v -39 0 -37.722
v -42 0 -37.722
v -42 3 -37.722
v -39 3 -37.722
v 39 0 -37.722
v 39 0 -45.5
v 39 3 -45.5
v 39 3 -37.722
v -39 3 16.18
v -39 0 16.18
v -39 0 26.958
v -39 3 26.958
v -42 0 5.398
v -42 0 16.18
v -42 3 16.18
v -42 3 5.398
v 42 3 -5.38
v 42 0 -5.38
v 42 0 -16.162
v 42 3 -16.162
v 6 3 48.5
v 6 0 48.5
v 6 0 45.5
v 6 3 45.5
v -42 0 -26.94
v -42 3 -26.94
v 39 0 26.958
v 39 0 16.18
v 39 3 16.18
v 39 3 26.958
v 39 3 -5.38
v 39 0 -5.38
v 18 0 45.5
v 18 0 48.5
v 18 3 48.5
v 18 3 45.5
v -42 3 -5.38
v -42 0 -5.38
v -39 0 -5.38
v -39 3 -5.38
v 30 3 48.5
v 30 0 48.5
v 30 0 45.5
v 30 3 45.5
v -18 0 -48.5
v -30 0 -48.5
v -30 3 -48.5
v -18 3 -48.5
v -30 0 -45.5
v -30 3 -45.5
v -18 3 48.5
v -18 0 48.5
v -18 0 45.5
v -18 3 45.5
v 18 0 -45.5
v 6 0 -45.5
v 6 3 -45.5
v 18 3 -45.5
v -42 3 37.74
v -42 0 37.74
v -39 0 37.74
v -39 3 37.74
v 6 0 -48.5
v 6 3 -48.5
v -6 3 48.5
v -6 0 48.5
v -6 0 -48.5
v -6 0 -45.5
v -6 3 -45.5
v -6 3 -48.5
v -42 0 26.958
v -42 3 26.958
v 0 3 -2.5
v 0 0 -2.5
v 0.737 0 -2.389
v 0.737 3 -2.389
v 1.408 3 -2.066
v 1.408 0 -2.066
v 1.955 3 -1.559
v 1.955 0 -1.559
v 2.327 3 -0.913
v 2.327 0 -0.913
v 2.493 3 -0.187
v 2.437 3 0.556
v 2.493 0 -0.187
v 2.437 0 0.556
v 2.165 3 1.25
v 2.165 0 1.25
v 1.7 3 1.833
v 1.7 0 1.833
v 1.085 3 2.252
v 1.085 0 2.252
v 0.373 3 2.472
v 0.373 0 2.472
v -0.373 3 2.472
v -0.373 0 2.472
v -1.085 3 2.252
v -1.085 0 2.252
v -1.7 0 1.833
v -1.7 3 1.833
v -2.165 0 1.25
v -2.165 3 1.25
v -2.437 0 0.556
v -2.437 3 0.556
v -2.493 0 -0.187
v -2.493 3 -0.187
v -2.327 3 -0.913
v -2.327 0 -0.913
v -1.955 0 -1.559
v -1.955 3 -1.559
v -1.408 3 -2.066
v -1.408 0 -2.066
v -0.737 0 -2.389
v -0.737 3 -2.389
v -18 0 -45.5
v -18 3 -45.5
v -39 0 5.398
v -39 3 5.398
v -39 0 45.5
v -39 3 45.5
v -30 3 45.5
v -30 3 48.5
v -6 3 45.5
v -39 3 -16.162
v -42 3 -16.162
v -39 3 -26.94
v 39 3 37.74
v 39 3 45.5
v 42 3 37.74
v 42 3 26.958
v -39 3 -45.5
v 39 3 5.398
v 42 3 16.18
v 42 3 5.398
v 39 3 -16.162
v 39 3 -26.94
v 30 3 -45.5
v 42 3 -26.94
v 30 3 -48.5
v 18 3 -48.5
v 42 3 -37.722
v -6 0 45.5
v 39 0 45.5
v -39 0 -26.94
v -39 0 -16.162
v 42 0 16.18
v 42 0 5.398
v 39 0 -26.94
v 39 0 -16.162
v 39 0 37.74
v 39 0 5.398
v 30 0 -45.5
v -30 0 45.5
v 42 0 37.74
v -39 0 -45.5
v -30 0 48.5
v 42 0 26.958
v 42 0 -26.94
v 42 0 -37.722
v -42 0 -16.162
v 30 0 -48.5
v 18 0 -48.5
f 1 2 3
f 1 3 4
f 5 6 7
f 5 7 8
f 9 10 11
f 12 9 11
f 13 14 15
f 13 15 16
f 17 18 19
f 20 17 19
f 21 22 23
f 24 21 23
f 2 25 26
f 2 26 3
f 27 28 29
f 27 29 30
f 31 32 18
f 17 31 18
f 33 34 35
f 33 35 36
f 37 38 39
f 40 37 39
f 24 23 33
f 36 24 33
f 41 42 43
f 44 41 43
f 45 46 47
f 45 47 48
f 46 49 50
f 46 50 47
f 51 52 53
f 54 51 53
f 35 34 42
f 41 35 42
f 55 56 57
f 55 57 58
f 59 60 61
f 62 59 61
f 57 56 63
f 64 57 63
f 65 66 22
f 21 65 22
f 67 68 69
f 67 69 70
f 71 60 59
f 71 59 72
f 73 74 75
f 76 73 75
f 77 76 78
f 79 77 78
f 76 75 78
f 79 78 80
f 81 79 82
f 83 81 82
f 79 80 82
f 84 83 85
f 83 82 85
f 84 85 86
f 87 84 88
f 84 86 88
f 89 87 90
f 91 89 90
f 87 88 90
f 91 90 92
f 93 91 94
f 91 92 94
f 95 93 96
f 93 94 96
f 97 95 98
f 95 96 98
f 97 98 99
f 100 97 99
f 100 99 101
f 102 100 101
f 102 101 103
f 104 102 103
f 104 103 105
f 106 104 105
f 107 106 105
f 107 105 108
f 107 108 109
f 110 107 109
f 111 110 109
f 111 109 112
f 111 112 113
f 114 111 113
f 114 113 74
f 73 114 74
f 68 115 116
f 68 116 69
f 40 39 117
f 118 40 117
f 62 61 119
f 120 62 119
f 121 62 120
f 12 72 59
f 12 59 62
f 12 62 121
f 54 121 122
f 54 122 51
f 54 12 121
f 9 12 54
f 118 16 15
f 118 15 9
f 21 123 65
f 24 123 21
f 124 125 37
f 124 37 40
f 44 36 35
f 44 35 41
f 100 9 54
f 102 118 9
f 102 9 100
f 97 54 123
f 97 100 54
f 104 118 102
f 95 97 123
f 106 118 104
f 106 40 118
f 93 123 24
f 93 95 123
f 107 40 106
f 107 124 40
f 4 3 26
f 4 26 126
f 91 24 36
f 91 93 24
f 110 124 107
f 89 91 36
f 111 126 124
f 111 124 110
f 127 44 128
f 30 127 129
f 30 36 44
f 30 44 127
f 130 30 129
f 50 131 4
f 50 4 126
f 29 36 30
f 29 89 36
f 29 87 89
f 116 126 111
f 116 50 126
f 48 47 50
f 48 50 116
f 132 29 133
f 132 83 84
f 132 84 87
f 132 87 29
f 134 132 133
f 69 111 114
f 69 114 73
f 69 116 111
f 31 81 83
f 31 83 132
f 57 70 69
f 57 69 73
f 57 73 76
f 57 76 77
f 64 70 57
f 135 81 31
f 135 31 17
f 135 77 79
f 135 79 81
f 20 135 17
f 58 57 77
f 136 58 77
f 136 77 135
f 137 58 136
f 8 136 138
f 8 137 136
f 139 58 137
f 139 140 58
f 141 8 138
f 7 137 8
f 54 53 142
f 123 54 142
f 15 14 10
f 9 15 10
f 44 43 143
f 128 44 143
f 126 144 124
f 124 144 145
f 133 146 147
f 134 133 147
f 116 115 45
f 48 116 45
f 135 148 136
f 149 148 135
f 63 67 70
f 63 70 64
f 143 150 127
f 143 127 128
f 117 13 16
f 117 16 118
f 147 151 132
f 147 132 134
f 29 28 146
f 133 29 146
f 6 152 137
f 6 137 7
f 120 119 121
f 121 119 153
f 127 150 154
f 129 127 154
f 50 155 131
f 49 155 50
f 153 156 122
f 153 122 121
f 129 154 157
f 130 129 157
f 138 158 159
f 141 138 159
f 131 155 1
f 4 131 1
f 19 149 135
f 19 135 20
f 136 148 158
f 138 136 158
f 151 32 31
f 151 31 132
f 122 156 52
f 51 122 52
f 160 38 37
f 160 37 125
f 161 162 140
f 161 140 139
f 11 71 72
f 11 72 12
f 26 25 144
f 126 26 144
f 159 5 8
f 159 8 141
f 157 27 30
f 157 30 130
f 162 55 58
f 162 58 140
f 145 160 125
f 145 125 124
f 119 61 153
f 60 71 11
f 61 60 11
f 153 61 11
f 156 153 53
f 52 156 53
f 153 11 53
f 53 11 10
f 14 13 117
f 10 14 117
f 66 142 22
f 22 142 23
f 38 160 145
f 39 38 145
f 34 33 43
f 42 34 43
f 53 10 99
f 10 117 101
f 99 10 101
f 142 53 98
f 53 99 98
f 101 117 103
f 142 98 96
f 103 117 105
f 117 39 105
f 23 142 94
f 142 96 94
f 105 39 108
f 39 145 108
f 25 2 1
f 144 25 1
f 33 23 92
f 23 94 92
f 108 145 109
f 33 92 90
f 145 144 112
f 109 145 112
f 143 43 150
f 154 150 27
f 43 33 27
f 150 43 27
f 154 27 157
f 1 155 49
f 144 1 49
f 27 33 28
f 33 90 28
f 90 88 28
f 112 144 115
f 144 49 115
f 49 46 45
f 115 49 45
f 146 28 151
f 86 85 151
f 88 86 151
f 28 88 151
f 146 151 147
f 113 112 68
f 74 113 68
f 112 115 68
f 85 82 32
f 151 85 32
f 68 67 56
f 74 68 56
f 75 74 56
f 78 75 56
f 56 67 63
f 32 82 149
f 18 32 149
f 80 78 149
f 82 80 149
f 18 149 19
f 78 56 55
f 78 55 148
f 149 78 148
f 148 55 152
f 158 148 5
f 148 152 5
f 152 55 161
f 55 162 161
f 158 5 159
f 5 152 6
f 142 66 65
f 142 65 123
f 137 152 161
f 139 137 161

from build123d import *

# Parameters (mm, degrees)
ESBO_O1_W                = 84
ESBO_O1_H                = 97
RESSALTO_EXTRUS_O1_DEPTH = 3
ESBO_O2_W                = 3
ESBO_O2_H                = 10.777777778
CORTE_EXTRUS_O4_DEPTH    = 3
CORTE_EXTRUS_O9_REACH    = 66.228
ESBO_O5_W                = 12
ESBO_O5_H                = 3
CORTE_EXTRUS_O10_REACH   = 66.228
ESBO_O6_R                = 2.5


with BuildPart() as part:
    # Esboço1 → Ressalto-extrusão1 (new body)
    with BuildSketch(Plane(origin=(0, 0, 0), x_dir=(1, 0, 0), z_dir=(0, 1, 0))):
        Rectangle(ESBO_O1_W, ESBO_O1_H)
    extrude(amount=RESSALTO_EXTRUS_O1_DEPTH)

    # Esboço2 → Corte-extrusão4 (cut)
    with BuildSketch(Plane.XZ):
        with Locations((-40.5, -43.111111111)):
            Rectangle(ESBO_O2_W, ESBO_O2_H)
        with Locations((40.5, -43.111111111)):
            Rectangle(ESBO_O2_W, ESBO_O2_H)
        with Locations((40.5, -21.551111111)):
            Rectangle(ESBO_O2_W, ESBO_O2_H)
        with Locations((40.5, 0.008888889)):
            Rectangle(ESBO_O2_W, ESBO_O2_H)
        with Locations((40.5, 21.568888889)):
            Rectangle(ESBO_O2_W, ESBO_O2_H)
        with Locations((40.5, 43.128888889)):
            Rectangle(ESBO_O2_W, ESBO_O2_H)
        with Locations((-40.5, -21.551111111)):
            Rectangle(ESBO_O2_W, ESBO_O2_H)
        with Locations((-40.5, 0.008888889)):
            Rectangle(ESBO_O2_W, ESBO_O2_H)
        with Locations((-40.5, 21.568888889)):
            Rectangle(ESBO_O2_W, ESBO_O2_H)
        with Locations((-40.5, 43.128888889)):
            Rectangle(ESBO_O2_W, ESBO_O2_H)
    extrude(amount=-CORTE_EXTRUS_O4_DEPTH, mode=Mode.SUBTRACT)

    # Esboço5 → Corte-extrusão9 (cut, up to next)
    with BuildSketch(Plane(origin=(0, 0, 0), x_dir=(1, 0, 0), z_dir=(0, 1, 0)), mode=Mode.PRIVATE) as corte_extrus_o9_sk1:
        with Locations((-36, 47)):
            Rectangle(ESBO_O5_W, ESBO_O5_H)
    corte_extrus_o9_tool1 = extrude(corte_extrus_o9_sk1.sketch, amount=CORTE_EXTRUS_O9_REACH, mode=Mode.PRIVATE) & part.part
    # Esboço5 → Corte-extrusão9 (cut, up to next)
    with BuildSketch(Plane(origin=(0, 0, 0), x_dir=(1, 0, 0), z_dir=(0, 1, 0)), mode=Mode.PRIVATE) as corte_extrus_o9_sk2:
        with Locations((-36, -47)):
            Rectangle(ESBO_O5_W, ESBO_O5_H)
    corte_extrus_o9_tool2 = extrude(corte_extrus_o9_sk2.sketch, amount=CORTE_EXTRUS_O9_REACH, mode=Mode.PRIVATE) & part.part
    # Esboço5 → Corte-extrusão9 (cut, up to next)
    with BuildSketch(Plane(origin=(0, 0, 0), x_dir=(1, 0, 0), z_dir=(0, 1, 0)), mode=Mode.PRIVATE) as corte_extrus_o9_sk3:
        with Locations((36, -47)):
            Rectangle(ESBO_O5_W, ESBO_O5_H)
    corte_extrus_o9_tool3 = extrude(corte_extrus_o9_sk3.sketch, amount=CORTE_EXTRUS_O9_REACH, mode=Mode.PRIVATE) & part.part
    # Esboço5 → Corte-extrusão9 (cut, up to next)
    with BuildSketch(Plane(origin=(0, 0, 0), x_dir=(1, 0, 0), z_dir=(0, 1, 0)), mode=Mode.PRIVATE) as corte_extrus_o9_sk4:
        with Locations((36, 47)):
            Rectangle(ESBO_O5_W, ESBO_O5_H)
    corte_extrus_o9_tool4 = extrude(corte_extrus_o9_sk4.sketch, amount=CORTE_EXTRUS_O9_REACH, mode=Mode.PRIVATE) & part.part
    # Esboço5 → Corte-extrusão9 (cut, up to next)
    with BuildSketch(Plane(origin=(0, 0, 0), x_dir=(1, 0, 0), z_dir=(0, 1, 0)), mode=Mode.PRIVATE) as corte_extrus_o9_sk5:
        with Locations((-12, -47)):
            Rectangle(ESBO_O5_W, ESBO_O5_H)
    corte_extrus_o9_tool5 = extrude(corte_extrus_o9_sk5.sketch, amount=CORTE_EXTRUS_O9_REACH, mode=Mode.PRIVATE) & part.part
    # Esboço5 → Corte-extrusão9 (cut, up to next)
    with BuildSketch(Plane(origin=(0, 0, 0), x_dir=(1, 0, 0), z_dir=(0, 1, 0)), mode=Mode.PRIVATE) as corte_extrus_o9_sk6:
        with Locations((12, -47)):
            Rectangle(ESBO_O5_W, ESBO_O5_H)
    corte_extrus_o9_tool6 = extrude(corte_extrus_o9_sk6.sketch, amount=CORTE_EXTRUS_O9_REACH, mode=Mode.PRIVATE) & part.part
    # Esboço5 → Corte-extrusão9 (cut, up to next)
    with BuildSketch(Plane(origin=(0, 0, 0), x_dir=(1, 0, 0), z_dir=(0, 1, 0)), mode=Mode.PRIVATE) as corte_extrus_o9_sk7:
        with Locations((-12, 47)):
            Rectangle(ESBO_O5_W, ESBO_O5_H)
    corte_extrus_o9_tool7 = extrude(corte_extrus_o9_sk7.sketch, amount=CORTE_EXTRUS_O9_REACH, mode=Mode.PRIVATE) & part.part
    # Esboço5 → Corte-extrusão9 (cut, up to next)
    with BuildSketch(Plane(origin=(0, 0, 0), x_dir=(1, 0, 0), z_dir=(0, 1, 0)), mode=Mode.PRIVATE) as corte_extrus_o9_sk8:
        with Locations((12, 47)):
            Rectangle(ESBO_O5_W, ESBO_O5_H)
    corte_extrus_o9_tool8 = extrude(corte_extrus_o9_sk8.sketch, amount=CORTE_EXTRUS_O9_REACH, mode=Mode.PRIVATE) & part.part
    add(corte_extrus_o9_tool1.solids().sort_by_distance((-36, 0, -47))[0], mode=Mode.SUBTRACT)
    add(corte_extrus_o9_tool2.solids().sort_by_distance((-36, 0, 47))[0], mode=Mode.SUBTRACT)
    add(corte_extrus_o9_tool3.solids().sort_by_distance((36, 0, 47))[0], mode=Mode.SUBTRACT)
    add(corte_extrus_o9_tool4.solids().sort_by_distance((36, 0, -47))[0], mode=Mode.SUBTRACT)
    add(corte_extrus_o9_tool5.solids().sort_by_distance((-12, 0, 47))[0], mode=Mode.SUBTRACT)
    add(corte_extrus_o9_tool6.solids().sort_by_distance((12, 0, 47))[0], mode=Mode.SUBTRACT)
    add(corte_extrus_o9_tool7.solids().sort_by_distance((-12, 0, -47))[0], mode=Mode.SUBTRACT)
    add(corte_extrus_o9_tool8.solids().sort_by_distance((12, 0, -47))[0], mode=Mode.SUBTRACT)

    # Esboço6 → Corte-extrusão10 (cut, up to next)
    with BuildSketch(Plane.XZ, mode=Mode.PRIVATE) as corte_extrus_o10_sk1:
        with Locations(Location((0, 0, 0), (0, 0, 270))):
            Circle(ESBO_O6_R)
    corte_extrus_o10_tool1 = extrude(corte_extrus_o10_sk1.sketch, amount=-CORTE_EXTRUS_O10_REACH, mode=Mode.PRIVATE) & part.part
    add(corte_extrus_o10_tool1.solids().sort_by_distance((0, 0, 0))[0], mode=Mode.SUBTRACT)


solid = part.part
